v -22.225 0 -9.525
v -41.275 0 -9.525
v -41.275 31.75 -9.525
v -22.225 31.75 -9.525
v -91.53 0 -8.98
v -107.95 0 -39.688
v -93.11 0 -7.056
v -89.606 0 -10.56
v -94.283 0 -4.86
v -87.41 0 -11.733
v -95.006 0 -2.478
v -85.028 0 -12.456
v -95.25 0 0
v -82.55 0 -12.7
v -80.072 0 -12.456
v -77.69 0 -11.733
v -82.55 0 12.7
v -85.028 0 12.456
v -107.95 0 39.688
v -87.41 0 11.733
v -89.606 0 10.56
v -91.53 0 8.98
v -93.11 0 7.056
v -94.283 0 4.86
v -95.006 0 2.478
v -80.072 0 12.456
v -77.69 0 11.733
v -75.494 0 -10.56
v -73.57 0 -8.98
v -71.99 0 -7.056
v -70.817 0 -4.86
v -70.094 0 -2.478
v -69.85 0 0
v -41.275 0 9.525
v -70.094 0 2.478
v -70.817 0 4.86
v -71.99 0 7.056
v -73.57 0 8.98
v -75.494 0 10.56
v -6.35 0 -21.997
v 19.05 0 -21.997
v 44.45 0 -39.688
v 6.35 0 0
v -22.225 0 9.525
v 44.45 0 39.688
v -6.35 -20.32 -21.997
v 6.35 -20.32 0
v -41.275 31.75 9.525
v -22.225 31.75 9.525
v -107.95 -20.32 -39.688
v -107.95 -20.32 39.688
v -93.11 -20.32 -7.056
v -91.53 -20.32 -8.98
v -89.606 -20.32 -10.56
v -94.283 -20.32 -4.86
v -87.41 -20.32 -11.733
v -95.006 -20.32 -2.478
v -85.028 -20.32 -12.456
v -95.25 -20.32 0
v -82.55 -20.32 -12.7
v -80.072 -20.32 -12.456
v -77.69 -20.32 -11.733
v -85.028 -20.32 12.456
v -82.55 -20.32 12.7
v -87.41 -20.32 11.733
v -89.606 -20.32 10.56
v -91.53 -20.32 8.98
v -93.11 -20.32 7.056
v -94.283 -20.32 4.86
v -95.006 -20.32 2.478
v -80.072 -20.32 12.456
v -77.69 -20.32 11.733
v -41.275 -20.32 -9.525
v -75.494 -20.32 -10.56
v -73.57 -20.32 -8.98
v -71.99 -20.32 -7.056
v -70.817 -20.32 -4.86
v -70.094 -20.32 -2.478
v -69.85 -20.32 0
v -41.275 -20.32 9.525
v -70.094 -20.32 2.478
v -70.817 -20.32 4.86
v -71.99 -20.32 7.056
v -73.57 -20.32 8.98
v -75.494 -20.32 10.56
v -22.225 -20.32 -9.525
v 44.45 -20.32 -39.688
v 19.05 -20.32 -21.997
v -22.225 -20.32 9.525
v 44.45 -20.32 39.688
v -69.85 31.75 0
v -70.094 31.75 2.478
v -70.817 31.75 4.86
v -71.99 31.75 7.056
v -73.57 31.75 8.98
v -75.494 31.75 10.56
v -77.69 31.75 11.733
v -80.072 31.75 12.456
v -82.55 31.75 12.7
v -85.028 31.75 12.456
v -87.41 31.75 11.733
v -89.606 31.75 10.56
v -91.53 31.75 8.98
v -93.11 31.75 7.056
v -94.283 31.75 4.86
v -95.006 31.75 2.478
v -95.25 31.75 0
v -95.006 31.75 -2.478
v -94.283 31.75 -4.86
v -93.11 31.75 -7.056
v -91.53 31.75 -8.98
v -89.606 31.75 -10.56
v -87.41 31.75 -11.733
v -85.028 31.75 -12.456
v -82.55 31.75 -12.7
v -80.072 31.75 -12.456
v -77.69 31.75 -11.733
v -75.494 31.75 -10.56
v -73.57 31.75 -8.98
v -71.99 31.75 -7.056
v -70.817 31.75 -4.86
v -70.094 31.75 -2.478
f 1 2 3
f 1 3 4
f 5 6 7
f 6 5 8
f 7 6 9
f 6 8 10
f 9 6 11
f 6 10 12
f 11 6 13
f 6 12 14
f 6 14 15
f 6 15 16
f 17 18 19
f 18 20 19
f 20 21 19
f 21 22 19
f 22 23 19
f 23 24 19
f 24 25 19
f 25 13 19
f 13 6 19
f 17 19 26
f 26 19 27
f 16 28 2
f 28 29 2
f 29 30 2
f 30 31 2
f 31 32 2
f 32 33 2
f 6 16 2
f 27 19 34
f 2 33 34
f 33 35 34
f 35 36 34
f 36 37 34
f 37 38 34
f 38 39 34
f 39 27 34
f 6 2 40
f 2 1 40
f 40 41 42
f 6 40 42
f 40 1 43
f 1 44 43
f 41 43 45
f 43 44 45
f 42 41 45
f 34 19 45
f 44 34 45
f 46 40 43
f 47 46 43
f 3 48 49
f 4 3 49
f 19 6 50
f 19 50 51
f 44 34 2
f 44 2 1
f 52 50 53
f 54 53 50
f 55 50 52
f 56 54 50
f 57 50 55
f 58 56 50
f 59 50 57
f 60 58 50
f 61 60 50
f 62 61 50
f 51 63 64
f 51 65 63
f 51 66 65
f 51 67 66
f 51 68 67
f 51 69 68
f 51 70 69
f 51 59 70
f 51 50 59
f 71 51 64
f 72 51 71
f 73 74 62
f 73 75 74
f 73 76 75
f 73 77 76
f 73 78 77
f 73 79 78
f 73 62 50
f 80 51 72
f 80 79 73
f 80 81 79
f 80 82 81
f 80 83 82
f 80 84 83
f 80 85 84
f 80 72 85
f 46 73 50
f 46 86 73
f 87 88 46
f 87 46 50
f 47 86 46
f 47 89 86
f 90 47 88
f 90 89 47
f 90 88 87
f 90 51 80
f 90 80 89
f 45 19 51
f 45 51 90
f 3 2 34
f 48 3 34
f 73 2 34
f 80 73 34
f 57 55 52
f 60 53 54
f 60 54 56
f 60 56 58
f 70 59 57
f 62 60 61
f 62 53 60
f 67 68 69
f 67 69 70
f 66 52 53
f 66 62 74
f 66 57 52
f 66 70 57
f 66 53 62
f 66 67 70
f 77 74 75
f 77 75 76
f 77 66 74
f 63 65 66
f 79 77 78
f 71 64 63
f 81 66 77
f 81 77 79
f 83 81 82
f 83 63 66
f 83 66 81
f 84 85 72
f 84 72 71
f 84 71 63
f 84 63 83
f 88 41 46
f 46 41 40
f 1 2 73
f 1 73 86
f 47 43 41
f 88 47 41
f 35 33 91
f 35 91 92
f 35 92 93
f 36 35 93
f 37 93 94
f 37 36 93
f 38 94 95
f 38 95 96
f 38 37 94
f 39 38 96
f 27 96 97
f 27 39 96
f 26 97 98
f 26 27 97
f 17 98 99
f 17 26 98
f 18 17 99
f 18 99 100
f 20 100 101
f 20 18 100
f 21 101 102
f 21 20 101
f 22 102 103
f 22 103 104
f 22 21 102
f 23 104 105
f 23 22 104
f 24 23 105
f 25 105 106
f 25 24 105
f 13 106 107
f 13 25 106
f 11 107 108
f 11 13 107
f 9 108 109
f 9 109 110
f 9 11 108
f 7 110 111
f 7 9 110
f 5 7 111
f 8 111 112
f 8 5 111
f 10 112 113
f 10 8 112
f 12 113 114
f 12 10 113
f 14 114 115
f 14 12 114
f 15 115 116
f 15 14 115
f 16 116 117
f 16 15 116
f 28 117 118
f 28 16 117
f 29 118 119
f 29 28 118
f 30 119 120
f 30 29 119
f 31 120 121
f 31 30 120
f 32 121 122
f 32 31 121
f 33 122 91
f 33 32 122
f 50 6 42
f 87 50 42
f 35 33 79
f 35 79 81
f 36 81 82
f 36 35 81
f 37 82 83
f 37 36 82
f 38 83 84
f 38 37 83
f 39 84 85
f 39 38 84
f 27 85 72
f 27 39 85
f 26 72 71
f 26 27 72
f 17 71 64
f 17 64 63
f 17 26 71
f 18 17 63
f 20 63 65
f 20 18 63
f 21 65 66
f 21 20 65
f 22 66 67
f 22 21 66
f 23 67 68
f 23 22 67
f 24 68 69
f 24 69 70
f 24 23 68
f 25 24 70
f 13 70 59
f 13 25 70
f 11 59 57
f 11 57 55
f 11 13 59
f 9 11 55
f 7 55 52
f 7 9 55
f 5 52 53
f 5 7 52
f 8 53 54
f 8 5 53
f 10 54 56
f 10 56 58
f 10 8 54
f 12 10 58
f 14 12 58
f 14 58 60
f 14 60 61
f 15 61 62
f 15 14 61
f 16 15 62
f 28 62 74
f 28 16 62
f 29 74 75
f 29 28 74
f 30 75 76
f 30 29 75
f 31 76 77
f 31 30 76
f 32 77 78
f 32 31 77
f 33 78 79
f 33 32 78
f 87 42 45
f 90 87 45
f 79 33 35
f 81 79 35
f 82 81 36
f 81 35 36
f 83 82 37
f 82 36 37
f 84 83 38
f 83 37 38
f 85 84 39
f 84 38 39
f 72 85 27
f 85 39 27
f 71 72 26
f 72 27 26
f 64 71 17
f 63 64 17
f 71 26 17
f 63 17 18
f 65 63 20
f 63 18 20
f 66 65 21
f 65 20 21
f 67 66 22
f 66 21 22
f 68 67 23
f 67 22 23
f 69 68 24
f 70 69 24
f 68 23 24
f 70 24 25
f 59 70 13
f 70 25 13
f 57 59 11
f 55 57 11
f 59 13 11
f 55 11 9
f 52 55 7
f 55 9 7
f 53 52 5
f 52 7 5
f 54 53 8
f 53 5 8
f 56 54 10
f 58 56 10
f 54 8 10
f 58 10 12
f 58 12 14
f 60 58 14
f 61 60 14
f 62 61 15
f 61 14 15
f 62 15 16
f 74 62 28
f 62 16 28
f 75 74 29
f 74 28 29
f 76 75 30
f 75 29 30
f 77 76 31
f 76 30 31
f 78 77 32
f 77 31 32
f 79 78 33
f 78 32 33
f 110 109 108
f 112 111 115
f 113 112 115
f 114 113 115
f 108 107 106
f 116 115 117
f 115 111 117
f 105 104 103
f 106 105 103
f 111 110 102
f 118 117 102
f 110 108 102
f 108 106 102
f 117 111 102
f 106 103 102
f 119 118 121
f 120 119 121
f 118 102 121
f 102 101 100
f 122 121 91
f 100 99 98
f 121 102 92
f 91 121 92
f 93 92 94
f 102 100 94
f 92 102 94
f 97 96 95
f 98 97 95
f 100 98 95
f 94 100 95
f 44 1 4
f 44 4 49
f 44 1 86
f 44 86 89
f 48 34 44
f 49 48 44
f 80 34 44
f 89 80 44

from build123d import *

# Parameters (mm, degrees)
F0_W          = 152.4
F0_H          = 79.375
F0_R          = 12.7
F0_W_2        = 19.05
F0_H_2        = 19.05
F1_DEPTH      = 20.32
F2_DEPTH      = 31.75
F2_DEPTH_BACK = 20.32
F3_DEPTH      = 31.75


with BuildPart() as f1:
    # F0 (on Front) → F1 (new body)
    with BuildSketch(Plane.XZ):
        with Locations((-31.75, 0)):
            Rectangle(F0_W, F0_H)
        Polygon((-6.35, -21.9970452561), (6.35, 0), (19.05, -21.9970452561), align=None, mode=Mode.SUBTRACT)
        with Locations((-82.55, 0)):
            Circle(F0_R, mode=Mode.SUBTRACT)
        with Locations((-31.75, 0)):
            Rectangle(F0_W_2, F0_H_2, mode=Mode.SUBTRACT)
    extrude(amount=F1_DEPTH)


with BuildPart() as f2:
    # F0 (on Front) → F2 (new body, two sides)
    with BuildSketch(Plane.XZ) as f2_sk:
        with Locations((-82.55, 0)):
            Circle(F0_R)
    extrude(amount=-F2_DEPTH)
    extrude(f2_sk.sketch, amount=F2_DEPTH_BACK)


with BuildPart() as f3:
    # F0 (on Front) → F3 (new body)
    with BuildSketch(Plane.XZ):
        with Locations((-31.75, 0)):
            Rectangle(F0_W_2, F0_H_2)
    extrude(amount=-F3_DEPTH)


solid = Compound([f1.part, f2.part, f3.part])
